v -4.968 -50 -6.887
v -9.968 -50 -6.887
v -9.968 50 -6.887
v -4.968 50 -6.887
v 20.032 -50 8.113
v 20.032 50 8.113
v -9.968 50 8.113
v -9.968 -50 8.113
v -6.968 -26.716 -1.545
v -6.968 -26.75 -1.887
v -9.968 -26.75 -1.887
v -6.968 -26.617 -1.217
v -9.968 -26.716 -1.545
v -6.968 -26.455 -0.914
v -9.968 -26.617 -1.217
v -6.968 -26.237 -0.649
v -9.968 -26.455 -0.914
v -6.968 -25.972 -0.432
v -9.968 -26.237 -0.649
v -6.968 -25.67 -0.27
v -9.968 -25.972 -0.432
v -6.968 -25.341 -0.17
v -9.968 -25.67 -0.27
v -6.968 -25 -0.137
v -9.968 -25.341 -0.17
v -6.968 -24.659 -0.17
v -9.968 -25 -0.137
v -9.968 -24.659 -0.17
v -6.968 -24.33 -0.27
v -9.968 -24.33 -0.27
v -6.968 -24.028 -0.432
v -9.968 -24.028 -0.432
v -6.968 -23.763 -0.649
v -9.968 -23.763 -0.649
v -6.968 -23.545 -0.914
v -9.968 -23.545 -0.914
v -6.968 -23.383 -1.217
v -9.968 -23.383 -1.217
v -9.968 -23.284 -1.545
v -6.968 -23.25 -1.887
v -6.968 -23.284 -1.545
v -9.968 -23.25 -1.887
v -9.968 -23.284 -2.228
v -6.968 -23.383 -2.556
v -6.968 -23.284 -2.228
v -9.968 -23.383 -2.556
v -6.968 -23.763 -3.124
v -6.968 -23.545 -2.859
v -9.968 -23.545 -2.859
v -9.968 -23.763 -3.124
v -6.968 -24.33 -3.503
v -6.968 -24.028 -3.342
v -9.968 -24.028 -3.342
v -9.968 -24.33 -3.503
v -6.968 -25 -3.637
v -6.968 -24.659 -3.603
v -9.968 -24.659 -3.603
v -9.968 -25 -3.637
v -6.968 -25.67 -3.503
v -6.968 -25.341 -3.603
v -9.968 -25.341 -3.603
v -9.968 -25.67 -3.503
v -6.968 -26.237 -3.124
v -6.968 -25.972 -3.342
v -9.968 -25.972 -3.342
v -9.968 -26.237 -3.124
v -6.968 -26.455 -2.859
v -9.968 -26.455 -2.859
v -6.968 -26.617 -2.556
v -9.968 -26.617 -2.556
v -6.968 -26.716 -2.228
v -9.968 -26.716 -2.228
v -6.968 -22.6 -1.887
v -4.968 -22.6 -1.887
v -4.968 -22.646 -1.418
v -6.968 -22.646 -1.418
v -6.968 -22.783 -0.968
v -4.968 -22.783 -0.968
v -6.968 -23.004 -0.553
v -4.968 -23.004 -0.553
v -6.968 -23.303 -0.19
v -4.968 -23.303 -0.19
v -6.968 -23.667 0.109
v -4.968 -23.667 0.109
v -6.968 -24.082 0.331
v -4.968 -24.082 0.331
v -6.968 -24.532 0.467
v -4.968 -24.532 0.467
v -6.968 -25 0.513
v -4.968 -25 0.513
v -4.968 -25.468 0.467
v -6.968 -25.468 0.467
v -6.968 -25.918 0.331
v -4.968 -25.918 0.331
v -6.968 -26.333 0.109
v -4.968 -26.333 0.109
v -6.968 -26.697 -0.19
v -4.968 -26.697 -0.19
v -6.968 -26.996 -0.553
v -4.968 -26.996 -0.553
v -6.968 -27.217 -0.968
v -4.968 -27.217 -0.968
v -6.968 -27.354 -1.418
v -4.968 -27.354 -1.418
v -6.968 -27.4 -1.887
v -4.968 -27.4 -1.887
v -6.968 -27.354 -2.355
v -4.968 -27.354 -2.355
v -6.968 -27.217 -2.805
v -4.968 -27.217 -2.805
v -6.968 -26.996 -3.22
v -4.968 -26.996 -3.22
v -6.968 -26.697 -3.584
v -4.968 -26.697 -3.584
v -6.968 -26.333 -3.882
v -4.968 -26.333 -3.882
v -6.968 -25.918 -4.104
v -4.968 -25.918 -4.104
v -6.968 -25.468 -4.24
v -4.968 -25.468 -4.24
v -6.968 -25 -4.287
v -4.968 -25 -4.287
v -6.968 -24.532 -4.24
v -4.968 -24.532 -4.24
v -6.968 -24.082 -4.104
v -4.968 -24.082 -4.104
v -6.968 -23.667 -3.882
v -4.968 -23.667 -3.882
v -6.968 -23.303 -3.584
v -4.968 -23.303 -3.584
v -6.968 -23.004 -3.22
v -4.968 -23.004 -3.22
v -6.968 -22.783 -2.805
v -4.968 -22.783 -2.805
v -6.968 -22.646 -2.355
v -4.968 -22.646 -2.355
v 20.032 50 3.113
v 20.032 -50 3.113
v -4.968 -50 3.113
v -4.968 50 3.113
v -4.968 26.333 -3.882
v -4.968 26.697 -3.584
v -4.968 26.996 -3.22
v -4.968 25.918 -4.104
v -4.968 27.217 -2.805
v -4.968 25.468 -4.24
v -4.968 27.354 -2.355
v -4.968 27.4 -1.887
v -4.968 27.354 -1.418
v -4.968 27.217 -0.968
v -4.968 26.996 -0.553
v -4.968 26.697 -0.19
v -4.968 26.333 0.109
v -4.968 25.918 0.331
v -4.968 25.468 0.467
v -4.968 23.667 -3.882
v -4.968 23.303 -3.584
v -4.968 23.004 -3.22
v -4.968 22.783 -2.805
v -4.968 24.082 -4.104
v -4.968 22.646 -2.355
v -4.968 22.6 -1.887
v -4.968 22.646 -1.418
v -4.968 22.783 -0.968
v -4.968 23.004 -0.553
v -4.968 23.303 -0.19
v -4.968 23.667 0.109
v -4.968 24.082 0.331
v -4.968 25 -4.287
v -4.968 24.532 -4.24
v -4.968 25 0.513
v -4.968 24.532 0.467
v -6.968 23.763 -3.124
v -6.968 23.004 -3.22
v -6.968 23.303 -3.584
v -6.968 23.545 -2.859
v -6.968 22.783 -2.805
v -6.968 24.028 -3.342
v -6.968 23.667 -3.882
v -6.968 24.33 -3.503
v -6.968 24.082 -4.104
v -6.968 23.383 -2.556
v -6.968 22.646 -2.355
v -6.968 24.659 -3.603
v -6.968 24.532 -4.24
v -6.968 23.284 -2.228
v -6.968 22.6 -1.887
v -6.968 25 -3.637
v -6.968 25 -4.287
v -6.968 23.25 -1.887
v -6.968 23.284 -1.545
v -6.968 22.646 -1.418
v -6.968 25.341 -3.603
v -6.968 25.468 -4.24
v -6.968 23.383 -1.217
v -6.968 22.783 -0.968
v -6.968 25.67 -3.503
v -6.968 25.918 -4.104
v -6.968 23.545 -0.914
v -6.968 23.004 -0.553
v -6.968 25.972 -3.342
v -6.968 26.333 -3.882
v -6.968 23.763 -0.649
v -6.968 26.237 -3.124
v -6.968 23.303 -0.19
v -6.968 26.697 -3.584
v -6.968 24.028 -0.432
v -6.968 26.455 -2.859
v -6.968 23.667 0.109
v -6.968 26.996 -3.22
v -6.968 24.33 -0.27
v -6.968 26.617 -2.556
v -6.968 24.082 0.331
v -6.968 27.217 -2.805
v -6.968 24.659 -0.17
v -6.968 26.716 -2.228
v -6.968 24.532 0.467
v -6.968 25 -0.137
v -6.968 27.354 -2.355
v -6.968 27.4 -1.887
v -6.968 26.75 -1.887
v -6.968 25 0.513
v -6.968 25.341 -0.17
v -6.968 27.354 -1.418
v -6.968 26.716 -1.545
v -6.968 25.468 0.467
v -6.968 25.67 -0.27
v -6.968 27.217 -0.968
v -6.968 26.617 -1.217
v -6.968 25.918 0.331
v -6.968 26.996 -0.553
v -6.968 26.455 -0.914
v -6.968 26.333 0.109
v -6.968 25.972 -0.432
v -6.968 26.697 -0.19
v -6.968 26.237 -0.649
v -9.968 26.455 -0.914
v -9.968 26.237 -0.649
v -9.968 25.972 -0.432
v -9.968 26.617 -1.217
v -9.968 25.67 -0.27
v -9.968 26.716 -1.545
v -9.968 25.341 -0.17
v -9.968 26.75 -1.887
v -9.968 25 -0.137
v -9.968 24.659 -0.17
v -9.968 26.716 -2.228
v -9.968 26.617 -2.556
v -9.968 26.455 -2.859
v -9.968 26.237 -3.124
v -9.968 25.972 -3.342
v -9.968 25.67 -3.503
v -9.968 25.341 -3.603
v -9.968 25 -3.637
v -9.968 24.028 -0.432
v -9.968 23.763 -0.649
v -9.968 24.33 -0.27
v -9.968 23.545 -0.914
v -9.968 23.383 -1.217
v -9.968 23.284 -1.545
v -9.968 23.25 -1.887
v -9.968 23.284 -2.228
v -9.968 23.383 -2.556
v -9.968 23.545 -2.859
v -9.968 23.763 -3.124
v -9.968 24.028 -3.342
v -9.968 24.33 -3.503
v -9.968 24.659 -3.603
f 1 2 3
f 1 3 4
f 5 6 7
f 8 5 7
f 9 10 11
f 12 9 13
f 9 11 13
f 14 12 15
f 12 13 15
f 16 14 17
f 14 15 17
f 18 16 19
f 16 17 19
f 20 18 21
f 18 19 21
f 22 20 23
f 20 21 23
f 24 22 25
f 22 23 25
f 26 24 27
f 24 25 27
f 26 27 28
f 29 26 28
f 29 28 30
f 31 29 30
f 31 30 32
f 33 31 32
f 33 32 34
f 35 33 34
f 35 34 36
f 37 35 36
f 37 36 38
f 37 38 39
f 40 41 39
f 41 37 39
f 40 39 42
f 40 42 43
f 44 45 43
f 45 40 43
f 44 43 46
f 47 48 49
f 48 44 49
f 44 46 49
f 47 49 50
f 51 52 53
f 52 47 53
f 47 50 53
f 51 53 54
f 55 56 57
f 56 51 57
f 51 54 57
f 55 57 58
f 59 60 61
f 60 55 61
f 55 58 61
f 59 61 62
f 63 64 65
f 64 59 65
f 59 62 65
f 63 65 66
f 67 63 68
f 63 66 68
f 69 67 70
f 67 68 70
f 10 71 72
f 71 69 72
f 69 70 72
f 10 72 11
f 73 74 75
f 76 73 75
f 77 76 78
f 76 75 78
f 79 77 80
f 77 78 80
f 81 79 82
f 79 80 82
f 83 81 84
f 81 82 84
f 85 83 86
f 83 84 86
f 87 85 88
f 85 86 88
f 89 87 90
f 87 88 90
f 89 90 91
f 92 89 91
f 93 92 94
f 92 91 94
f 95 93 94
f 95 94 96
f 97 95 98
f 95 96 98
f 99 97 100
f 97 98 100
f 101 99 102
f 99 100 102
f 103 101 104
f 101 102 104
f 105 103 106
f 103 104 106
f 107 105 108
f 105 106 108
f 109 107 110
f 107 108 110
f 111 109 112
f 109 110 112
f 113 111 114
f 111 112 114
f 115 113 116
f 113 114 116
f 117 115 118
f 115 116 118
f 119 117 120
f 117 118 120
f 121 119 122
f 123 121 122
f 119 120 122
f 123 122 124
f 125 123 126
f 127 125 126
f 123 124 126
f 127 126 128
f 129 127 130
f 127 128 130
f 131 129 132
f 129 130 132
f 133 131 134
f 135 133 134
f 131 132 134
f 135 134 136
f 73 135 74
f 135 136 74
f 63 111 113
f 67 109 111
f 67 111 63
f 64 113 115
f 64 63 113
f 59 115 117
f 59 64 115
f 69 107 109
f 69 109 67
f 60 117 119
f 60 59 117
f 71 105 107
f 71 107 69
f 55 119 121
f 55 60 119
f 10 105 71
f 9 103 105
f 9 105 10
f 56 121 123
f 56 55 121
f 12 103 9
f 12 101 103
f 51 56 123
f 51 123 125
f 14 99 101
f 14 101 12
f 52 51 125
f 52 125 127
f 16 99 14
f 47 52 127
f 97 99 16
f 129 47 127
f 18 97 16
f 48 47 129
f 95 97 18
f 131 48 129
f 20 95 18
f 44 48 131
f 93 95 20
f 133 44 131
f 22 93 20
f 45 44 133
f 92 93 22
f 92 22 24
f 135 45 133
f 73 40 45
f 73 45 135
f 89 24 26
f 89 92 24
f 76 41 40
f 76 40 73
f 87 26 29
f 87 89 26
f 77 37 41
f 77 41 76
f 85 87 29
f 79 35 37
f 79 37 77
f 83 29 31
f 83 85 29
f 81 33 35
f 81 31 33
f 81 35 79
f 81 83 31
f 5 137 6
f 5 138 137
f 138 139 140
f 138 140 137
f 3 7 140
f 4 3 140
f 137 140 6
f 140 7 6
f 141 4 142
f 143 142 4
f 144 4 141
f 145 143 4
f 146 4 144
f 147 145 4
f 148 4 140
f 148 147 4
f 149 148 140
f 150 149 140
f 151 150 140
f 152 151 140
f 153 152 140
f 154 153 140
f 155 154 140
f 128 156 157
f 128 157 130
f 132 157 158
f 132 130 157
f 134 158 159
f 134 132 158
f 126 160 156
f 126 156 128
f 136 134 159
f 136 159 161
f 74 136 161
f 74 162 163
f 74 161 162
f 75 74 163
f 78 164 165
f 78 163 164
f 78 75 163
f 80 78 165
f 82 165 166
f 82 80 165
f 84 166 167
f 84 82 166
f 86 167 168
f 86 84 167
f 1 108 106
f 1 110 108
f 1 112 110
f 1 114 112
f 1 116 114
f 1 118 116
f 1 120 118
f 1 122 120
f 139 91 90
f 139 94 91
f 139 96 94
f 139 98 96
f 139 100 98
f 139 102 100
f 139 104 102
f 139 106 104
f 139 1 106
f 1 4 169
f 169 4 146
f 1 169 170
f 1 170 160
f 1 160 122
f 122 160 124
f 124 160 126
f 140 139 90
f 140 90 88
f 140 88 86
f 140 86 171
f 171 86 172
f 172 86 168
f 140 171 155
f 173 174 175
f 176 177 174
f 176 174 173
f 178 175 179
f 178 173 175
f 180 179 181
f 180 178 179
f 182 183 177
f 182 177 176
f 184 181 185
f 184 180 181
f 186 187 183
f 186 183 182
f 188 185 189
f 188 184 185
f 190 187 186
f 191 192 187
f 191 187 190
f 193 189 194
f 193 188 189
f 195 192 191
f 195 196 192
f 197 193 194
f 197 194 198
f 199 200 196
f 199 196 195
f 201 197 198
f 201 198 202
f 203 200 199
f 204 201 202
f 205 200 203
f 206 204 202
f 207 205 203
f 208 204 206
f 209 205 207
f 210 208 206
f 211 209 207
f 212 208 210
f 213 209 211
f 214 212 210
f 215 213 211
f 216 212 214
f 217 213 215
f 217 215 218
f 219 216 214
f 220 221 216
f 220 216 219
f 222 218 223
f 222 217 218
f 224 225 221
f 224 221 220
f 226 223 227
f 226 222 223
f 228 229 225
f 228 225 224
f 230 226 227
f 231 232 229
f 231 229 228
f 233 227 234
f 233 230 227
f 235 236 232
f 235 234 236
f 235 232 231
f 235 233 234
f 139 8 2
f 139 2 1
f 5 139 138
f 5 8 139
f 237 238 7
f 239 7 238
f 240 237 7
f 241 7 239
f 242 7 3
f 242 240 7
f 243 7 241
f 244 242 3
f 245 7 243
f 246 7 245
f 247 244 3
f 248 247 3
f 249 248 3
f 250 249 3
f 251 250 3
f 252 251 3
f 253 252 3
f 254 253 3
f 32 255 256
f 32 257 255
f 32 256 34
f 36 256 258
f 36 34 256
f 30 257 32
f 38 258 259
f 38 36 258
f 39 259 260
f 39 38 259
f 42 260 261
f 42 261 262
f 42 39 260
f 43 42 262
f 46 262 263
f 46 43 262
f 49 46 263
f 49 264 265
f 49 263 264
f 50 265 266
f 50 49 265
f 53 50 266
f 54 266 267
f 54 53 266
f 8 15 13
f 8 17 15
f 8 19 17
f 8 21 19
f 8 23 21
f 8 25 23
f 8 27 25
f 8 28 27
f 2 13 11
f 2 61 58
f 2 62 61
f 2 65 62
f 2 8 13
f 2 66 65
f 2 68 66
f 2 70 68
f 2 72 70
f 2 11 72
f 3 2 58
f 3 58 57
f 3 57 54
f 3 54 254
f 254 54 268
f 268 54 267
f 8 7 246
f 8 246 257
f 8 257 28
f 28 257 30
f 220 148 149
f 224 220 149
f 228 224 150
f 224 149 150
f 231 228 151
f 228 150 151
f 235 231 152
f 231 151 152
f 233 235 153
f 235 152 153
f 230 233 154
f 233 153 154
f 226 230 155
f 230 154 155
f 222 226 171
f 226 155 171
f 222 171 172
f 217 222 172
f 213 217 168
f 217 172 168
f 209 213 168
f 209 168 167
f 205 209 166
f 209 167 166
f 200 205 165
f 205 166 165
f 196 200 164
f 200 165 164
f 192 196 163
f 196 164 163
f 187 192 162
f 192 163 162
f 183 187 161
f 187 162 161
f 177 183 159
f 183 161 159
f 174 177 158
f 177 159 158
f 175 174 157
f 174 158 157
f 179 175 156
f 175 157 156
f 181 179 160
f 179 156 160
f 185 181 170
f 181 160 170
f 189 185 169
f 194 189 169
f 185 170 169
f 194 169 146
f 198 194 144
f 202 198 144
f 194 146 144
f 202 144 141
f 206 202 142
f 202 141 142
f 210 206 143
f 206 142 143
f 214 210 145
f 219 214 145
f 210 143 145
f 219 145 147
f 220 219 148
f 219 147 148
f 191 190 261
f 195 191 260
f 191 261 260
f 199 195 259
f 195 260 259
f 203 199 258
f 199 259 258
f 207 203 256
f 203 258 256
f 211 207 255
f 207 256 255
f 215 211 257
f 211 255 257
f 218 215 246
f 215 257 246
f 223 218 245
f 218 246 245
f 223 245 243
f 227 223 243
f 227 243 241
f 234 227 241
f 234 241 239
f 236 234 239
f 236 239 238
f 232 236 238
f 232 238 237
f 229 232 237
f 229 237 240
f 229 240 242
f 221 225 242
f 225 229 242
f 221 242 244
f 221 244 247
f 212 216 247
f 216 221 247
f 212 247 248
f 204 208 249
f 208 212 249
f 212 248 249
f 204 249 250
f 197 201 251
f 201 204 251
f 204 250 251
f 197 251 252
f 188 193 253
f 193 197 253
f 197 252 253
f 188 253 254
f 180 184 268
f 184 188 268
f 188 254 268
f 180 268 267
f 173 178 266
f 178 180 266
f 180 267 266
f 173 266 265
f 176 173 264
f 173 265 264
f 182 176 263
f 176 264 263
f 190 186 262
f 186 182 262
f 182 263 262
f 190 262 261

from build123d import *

# Parameters (mm, degrees)
F1_DEPTH = 50
F3_D     = 3.5
F4_R     = 2.4
F4_R_2   = 1.75
F5_DEPTH = 2


with BuildPart() as f1:
    # F0 (on Front) → F1 (new body, symmetric)
    with BuildSketch(Plane.XZ):
        Polygon((-9.9684563031, 8.1134089709), (-9.9684563031, -6.8865910291), (-4.9684563031, -6.8865910291), (-4.9684563031, 3.1134089709), (20.0315436969, 3.1134089709), (20.0315436969, 8.1134089709), align=None)
    extrude(amount=F1_DEPTH, both=True)

    # F3 (through all)
    with Locations(Plane.YZ.offset(-4.9684563031)):
        with Locations((-25, -1.8865910291), (25, -1.8865910291)):
            Hole(F3_D / 2)

    # F4 (on face) → F5 (cut)
    with BuildSketch(Plane.YZ.offset(-4.9684563031)):
        with Locations((-25, -1.8865910291)):
            Circle(F4_R)
        with Locations((-25, -1.8865910291)):
            Circle(F4_R_2, mode=Mode.SUBTRACT)
        with Locations((25, -1.8865910291)):
            Circle(F4_R)
        with Locations((25, -1.8865910291)):
            Circle(F4_R_2, mode=Mode.SUBTRACT)
    extrude(amount=-F5_DEPTH, mode=Mode.SUBTRACT)


solid = f1.part
